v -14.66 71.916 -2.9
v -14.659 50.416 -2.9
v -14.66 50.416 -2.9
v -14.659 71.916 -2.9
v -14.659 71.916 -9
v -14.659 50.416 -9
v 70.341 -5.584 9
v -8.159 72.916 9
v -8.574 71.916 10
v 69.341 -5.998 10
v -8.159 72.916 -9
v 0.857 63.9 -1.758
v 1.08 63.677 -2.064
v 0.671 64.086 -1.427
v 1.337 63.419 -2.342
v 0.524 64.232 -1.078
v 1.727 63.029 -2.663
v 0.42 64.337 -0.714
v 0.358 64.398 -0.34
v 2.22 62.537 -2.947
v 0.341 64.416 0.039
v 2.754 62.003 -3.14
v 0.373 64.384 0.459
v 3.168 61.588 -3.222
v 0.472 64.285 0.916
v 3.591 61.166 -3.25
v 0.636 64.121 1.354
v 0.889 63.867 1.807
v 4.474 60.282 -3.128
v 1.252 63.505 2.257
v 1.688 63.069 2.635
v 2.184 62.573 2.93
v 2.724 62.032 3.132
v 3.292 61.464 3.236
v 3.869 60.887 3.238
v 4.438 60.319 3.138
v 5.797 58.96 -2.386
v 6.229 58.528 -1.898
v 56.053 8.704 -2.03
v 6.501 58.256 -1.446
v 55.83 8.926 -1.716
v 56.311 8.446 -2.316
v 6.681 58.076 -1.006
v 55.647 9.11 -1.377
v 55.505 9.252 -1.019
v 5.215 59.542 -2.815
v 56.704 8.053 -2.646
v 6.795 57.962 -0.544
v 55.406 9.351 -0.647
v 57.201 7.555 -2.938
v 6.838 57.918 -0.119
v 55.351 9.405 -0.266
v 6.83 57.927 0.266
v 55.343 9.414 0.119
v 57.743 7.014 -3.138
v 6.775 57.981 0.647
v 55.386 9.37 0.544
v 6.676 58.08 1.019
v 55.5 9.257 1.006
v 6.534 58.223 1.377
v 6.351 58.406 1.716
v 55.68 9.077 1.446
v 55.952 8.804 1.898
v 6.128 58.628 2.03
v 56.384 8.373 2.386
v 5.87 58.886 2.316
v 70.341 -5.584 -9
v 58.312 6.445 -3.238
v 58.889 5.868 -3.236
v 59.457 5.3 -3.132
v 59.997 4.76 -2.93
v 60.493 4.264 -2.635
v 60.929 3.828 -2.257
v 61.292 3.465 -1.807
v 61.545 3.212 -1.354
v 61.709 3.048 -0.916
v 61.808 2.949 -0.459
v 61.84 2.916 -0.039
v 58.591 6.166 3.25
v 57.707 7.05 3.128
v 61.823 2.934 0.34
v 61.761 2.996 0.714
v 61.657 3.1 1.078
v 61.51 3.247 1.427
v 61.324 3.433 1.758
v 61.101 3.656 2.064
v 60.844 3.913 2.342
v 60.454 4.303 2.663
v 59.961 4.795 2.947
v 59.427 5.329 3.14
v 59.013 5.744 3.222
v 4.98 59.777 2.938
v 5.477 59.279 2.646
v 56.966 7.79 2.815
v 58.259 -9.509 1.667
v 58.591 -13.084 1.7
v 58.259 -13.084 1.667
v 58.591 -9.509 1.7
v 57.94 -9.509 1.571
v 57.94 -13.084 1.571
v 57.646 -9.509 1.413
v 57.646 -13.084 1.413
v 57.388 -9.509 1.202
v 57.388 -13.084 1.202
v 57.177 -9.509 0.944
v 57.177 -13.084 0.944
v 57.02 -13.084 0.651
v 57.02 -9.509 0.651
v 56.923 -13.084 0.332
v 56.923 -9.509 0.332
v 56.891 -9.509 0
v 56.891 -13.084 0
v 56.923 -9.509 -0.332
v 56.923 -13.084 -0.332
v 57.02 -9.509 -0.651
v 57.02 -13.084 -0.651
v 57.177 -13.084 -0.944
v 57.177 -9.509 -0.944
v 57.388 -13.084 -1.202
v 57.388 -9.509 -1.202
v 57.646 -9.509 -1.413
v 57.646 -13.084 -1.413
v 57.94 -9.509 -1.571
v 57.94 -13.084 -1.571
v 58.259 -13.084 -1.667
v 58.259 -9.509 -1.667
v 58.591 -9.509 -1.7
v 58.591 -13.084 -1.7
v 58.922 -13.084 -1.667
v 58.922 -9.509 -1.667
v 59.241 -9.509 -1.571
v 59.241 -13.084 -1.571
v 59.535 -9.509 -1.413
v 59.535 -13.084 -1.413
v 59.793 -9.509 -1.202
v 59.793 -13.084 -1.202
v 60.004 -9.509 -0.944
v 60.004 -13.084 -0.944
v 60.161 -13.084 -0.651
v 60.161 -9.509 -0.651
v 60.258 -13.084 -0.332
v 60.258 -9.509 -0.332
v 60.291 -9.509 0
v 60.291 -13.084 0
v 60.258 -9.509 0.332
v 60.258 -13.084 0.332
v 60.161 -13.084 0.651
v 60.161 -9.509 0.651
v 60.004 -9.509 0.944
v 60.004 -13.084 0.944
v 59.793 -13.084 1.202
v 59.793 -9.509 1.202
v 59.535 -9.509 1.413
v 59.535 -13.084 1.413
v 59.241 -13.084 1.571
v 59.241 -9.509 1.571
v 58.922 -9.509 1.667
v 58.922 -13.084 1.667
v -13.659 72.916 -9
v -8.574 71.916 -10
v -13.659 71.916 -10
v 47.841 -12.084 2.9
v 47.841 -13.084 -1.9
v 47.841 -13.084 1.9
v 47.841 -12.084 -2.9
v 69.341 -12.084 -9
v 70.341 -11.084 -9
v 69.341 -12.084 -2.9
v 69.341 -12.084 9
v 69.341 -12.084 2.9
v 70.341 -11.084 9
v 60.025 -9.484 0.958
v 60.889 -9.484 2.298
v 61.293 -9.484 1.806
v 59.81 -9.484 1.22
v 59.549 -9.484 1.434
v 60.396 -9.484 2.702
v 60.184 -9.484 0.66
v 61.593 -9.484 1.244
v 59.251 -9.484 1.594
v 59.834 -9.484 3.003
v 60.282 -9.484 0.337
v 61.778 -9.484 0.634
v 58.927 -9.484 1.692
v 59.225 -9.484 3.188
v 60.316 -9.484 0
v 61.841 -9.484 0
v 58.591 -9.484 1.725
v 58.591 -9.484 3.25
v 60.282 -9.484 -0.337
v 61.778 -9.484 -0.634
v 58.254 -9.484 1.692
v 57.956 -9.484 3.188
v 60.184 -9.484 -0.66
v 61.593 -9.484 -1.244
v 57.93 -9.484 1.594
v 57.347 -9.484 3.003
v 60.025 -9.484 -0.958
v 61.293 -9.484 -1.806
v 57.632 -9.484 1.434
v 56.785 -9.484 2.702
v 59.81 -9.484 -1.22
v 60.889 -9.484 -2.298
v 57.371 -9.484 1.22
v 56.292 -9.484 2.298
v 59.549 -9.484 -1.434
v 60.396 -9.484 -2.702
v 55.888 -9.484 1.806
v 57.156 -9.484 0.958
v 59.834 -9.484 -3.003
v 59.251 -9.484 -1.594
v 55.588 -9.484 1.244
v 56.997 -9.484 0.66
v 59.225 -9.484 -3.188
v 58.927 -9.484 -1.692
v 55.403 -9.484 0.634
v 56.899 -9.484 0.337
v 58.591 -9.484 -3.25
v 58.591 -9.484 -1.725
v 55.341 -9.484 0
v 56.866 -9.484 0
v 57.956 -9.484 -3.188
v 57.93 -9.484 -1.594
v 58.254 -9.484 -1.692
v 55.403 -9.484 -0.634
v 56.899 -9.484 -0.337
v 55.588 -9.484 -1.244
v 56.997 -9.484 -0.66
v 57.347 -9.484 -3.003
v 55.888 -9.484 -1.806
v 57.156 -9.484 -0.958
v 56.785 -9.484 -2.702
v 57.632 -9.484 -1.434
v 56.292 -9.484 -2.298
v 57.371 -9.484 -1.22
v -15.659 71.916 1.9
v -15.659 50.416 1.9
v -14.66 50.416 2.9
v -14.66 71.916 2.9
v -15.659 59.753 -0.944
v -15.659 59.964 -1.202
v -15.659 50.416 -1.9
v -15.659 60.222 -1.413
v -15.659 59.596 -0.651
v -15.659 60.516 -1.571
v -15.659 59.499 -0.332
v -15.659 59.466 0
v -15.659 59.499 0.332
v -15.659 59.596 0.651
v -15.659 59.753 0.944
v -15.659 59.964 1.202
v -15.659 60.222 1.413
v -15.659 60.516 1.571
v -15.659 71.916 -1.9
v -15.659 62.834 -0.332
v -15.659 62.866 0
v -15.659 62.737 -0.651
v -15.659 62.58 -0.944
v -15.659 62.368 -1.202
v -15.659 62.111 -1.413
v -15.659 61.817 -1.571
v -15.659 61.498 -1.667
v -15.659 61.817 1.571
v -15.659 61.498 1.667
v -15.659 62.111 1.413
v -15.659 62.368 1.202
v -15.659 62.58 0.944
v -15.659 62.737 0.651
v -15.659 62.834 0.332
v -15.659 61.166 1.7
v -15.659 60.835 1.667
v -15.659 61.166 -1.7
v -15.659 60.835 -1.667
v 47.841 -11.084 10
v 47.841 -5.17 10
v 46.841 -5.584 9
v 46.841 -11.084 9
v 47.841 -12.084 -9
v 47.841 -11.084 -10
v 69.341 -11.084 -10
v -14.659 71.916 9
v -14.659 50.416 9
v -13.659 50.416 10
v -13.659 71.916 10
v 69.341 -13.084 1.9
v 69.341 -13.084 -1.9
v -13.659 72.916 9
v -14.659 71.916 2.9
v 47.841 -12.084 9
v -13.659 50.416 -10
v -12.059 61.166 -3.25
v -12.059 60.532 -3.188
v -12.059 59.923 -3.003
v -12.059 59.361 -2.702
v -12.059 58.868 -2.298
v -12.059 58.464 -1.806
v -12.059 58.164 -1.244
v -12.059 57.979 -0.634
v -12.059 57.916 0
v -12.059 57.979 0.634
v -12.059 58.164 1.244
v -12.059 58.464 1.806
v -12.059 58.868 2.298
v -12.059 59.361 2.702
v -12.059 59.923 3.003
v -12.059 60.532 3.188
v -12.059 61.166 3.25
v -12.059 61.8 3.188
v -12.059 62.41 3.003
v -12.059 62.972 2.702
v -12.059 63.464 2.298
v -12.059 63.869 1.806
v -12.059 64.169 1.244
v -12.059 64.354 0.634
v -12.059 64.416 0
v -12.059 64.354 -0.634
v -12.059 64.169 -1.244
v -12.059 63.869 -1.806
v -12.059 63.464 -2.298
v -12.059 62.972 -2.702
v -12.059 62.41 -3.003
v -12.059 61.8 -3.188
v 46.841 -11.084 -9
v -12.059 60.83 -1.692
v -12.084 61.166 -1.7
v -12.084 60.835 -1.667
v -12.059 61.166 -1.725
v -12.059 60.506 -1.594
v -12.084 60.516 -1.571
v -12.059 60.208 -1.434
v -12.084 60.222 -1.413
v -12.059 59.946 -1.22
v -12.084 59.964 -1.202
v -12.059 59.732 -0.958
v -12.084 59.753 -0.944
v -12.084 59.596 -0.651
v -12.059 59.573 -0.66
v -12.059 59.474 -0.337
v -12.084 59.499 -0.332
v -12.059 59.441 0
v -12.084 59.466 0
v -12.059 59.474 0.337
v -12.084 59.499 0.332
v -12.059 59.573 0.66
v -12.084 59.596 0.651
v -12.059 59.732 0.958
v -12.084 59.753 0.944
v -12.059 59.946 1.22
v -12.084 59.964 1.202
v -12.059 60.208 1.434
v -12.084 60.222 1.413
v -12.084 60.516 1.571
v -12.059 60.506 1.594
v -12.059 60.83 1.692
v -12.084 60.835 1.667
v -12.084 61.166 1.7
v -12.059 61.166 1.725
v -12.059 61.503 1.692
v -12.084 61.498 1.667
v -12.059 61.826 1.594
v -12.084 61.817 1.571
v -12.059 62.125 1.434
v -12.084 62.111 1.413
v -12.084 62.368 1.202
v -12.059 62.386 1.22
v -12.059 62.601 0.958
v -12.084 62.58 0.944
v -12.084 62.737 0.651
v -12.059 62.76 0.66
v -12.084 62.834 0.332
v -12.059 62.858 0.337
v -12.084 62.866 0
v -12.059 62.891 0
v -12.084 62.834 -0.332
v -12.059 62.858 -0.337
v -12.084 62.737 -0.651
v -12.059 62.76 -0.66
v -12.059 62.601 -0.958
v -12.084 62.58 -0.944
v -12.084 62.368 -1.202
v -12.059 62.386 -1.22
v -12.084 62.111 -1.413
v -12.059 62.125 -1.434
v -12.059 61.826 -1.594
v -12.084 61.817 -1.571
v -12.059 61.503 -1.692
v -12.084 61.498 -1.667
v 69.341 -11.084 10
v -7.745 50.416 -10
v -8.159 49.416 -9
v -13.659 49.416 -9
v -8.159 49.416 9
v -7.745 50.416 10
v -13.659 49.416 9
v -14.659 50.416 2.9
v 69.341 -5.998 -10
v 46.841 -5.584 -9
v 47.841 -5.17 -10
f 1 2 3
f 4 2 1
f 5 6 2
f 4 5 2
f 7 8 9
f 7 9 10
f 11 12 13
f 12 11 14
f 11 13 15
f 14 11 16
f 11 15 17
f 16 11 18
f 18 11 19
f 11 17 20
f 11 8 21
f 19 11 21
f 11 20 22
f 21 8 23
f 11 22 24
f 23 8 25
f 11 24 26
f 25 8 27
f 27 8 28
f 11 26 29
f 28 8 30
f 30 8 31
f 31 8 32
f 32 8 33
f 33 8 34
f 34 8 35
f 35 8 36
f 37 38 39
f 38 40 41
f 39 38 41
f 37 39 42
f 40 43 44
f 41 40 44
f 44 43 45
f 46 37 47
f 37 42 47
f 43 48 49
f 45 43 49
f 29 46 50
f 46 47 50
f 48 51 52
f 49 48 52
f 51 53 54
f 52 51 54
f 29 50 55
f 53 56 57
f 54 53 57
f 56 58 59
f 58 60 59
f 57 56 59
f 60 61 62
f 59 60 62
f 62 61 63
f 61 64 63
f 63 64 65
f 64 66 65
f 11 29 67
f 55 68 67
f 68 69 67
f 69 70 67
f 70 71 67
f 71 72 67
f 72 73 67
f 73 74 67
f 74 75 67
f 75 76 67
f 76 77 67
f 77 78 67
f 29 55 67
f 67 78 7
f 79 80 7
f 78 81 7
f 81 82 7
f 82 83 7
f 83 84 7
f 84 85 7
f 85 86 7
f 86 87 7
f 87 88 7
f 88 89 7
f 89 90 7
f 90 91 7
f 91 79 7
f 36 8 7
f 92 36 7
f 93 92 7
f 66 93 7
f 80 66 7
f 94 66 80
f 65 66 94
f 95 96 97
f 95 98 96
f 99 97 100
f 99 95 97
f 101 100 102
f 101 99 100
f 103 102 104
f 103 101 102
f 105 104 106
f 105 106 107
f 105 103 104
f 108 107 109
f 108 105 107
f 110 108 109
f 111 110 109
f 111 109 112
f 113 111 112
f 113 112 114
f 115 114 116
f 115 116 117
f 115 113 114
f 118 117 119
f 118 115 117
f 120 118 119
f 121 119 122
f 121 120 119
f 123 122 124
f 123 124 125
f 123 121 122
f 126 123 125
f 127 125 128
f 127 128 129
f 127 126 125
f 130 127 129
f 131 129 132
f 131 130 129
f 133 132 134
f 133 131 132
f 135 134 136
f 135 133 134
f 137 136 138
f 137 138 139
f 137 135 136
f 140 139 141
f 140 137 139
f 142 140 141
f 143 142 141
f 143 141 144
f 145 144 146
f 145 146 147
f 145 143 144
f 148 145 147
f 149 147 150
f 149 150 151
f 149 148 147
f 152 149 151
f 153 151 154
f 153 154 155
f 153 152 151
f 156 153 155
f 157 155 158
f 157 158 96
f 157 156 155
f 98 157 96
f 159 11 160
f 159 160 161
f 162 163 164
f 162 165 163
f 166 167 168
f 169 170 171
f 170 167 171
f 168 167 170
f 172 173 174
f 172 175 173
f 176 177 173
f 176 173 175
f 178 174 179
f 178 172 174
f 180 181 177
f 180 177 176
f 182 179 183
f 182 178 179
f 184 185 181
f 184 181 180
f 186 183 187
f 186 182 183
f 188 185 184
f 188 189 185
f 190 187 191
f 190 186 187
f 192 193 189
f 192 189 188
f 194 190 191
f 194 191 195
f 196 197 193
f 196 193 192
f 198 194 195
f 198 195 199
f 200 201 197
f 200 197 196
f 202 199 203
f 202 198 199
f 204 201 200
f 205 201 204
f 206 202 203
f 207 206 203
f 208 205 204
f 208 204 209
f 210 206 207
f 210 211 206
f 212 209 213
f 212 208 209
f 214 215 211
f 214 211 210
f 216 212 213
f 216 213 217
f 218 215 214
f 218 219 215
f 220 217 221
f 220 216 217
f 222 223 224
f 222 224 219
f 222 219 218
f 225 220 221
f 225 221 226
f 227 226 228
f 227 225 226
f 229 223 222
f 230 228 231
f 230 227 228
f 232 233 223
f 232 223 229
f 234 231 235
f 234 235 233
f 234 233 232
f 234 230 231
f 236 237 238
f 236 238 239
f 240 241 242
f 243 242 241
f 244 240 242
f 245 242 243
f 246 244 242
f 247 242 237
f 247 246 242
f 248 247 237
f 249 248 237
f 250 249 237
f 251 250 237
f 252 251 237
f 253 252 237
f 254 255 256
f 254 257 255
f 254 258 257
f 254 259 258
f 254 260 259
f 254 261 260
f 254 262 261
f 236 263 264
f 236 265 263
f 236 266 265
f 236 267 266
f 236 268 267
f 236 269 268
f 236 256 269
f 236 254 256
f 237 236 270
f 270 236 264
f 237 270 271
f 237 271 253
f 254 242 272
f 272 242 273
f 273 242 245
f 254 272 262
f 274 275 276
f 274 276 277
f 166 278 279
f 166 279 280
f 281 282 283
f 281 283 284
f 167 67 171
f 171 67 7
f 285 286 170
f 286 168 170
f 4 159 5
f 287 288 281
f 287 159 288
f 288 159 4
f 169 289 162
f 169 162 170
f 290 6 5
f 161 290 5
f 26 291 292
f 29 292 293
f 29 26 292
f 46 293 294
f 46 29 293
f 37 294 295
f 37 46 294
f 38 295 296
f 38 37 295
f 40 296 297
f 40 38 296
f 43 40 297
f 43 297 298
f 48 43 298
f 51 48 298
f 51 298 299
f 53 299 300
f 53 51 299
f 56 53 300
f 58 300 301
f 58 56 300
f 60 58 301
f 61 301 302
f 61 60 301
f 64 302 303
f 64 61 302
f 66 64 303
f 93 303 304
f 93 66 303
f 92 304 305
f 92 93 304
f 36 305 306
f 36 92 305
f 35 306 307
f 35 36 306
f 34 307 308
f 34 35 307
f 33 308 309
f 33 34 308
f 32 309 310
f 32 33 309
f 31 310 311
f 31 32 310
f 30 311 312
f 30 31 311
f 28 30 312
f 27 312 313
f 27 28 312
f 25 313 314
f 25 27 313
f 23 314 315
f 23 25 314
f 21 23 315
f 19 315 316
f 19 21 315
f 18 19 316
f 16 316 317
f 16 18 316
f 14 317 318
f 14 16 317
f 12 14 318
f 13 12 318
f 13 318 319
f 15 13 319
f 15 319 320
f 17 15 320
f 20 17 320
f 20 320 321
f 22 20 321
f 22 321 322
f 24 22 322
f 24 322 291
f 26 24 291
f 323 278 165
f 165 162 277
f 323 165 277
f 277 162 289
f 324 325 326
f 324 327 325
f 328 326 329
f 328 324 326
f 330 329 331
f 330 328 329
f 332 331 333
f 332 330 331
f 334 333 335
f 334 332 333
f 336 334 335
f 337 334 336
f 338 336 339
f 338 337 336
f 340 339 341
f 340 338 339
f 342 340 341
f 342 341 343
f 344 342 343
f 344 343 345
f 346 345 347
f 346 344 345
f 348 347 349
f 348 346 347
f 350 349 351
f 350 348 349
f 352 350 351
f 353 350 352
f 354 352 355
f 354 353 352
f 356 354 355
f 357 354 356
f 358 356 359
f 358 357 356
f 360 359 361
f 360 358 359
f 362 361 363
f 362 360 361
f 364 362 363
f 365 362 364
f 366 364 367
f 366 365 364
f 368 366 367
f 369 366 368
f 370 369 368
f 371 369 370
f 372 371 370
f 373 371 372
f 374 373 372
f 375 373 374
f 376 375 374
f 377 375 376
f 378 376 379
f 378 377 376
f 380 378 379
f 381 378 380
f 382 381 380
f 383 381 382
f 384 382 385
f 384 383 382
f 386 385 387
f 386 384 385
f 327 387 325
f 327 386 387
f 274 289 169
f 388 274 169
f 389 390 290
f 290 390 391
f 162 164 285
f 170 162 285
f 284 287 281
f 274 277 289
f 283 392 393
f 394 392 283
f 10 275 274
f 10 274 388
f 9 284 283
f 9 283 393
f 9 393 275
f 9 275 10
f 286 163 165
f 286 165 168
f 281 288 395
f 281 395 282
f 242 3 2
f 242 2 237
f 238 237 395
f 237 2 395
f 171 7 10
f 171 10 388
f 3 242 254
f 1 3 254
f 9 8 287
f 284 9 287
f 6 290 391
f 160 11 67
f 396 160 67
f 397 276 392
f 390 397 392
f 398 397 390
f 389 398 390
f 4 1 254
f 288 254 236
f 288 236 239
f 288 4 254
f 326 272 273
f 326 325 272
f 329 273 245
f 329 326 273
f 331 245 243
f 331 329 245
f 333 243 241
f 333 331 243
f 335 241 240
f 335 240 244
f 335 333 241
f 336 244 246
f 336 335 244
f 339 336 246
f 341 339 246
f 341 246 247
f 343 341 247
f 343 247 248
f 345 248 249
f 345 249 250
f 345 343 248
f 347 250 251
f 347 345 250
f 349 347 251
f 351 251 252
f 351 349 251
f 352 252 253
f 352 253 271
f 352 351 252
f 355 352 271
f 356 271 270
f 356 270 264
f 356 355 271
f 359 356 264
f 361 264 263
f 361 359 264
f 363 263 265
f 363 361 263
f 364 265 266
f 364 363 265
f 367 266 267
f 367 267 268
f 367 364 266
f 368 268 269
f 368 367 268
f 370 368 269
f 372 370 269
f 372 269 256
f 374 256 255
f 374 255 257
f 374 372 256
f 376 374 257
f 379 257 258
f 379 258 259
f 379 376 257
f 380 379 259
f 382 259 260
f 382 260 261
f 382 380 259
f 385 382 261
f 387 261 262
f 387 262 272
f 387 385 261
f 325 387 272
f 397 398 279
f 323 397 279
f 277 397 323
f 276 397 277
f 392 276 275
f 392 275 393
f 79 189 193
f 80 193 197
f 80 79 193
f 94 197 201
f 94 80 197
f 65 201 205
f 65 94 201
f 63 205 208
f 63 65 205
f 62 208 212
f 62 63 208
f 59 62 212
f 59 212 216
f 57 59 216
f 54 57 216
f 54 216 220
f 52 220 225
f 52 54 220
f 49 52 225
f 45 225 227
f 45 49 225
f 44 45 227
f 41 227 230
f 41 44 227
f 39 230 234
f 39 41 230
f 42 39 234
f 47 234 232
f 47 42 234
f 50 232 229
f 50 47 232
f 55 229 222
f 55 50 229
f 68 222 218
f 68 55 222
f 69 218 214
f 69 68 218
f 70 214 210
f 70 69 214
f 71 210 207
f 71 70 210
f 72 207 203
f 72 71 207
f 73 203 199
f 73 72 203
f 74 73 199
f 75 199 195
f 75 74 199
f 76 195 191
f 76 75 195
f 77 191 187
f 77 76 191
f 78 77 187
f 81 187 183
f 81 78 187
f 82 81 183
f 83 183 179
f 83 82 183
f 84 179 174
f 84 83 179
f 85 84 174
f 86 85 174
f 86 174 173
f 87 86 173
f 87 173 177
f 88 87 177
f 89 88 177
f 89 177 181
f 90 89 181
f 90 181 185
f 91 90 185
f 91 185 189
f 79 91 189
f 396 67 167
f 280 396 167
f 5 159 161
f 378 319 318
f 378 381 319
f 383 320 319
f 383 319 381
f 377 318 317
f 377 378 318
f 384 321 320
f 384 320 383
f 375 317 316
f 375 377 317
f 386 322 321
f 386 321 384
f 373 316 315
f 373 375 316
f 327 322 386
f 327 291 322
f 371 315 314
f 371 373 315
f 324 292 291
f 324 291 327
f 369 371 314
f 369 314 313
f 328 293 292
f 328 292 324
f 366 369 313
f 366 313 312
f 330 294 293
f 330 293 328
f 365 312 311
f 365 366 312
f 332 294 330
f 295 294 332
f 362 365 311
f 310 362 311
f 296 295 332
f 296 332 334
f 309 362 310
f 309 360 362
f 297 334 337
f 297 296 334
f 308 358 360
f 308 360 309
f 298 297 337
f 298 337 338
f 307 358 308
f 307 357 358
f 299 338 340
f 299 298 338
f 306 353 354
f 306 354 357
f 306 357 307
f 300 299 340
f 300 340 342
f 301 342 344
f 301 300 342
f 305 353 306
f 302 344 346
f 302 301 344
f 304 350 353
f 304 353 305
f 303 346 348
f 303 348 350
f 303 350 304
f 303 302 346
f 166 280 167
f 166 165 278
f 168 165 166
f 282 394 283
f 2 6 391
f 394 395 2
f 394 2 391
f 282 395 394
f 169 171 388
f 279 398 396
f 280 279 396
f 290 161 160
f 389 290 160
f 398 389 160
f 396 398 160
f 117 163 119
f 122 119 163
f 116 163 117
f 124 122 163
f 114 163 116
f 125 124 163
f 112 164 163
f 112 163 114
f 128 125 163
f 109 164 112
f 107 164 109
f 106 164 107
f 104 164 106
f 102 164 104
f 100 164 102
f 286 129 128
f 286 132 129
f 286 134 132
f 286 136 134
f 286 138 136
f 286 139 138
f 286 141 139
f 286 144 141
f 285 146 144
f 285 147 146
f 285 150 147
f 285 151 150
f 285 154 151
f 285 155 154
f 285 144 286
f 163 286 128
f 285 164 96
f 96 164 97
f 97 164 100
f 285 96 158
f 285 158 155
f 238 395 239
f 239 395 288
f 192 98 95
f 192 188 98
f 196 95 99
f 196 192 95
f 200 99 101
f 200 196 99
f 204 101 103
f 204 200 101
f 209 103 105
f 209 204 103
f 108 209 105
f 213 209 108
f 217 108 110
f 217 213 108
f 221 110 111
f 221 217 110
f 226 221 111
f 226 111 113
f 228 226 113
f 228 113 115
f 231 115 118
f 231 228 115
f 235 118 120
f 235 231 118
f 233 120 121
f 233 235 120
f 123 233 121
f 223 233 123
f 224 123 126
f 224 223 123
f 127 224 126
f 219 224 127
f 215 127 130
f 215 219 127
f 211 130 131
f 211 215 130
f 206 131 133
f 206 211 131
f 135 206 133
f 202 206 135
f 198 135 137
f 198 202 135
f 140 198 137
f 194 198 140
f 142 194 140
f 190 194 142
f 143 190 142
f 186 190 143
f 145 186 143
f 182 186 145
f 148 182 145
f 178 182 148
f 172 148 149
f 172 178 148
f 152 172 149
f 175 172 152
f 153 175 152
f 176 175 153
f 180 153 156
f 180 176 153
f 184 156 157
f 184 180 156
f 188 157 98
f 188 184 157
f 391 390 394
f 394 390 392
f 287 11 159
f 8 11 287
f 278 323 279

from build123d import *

# Parameters (mm, degrees)
BOSS_EXTRUDE1_DEPTH = 10
SKETCH29_W          = 20
SKETCH29_H          = 23.5
BOSS_EXTRUDE4_DEPTH = 6.5
SKETCH30_W          = 23.5
SKETCH30_H          = 20
BOSS_EXTRUDE5_DEPTH = 6.5
CHAMFER1_SIZE       = 1
SKETCH4_W           = 21.5
SKETCH4_H           = 5.8
BOSS_EXTRUDE2_DEPTH = 1
SKETCH5_W           = 5.8
SKETCH5_H           = 21.5
BOSS_EXTRUDE3_DEPTH = 1
CHAMFER2_SIZE       = 1


with BuildPart() as part:
    # Sketch2 → Boss-Extrude1 (new, symmetric)
    with BuildSketch(Plane.XY):
        Polygon((-8.159496186, 72.916243655), (70.340503814, -5.583756345), (46.840503814, -5.583756345), (-8.159496186, 49.416243655), align=None)
    extrude(amount=BOSS_EXTRUDE1_DEPTH, both=True)

    # Sketch29 → Boss-Extrude4 (add)
    with BuildSketch(Plane.ZY.offset(8.159496186)):
        with Locations((0, 61.166243655)):
            Rectangle(SKETCH29_W, SKETCH29_H)
    extrude(amount=BOSS_EXTRUDE4_DEPTH)

    # Sketch30 → Boss-Extrude5 (add)
    with BuildSketch(Plane.XZ.offset(5.583756345)):
        with Locations((58.590503814, 0)):
            Rectangle(SKETCH30_W, SKETCH30_H)
    extrude(amount=BOSS_EXTRUDE5_DEPTH)

    # Chamfer1
    chamfer1_edges = [part.edges().sort_by_distance(p)[0] for p in [
        (-11.409496186, 72.916243655, 10),
        (-11.409496186, 72.916243655, -10),
        (-11.409496186, 49.416243655, -10),
        (-11.409496186, 49.416243655, 10),
        (-14.659496186, 72.916243655, 0),
        (-14.659496186, 61.166243655, -10),
        (31.090503814, 33.666243655, 10),
        (-14.659496186, 49.416243655, 0),
        (-14.659496186, 61.166243655, 10),
        (46.840503814, -8.833756345, 10),
        (46.840503814, -8.833756345, -10),
        (70.340503814, -8.833756345, -10),
        (70.340503814, -8.833756345, 10),
        (46.840503814, -12.083756345, 0),
        (58.590503814, -12.083756345, -10),
        (70.340503814, -12.083756345, 0),
        (58.590503814, -12.083756345, 10),
        (31.090503814, 33.666243655, -10),
        (19.340503814, 21.916243655, -10),
        (19.340503814, 21.916243655, 10),
    ]]
    chamfer(chamfer1_edges, length=CHAMFER1_SIZE)

    # Sketch4 → Boss-Extrude2 (add)
    with BuildSketch(Plane.XZ.offset(12.083756345)):
        with Locations((58.590503814, 0)):
            Rectangle(SKETCH4_W, SKETCH4_H)
    extrude(amount=BOSS_EXTRUDE2_DEPTH)

    # Sketch5 → Boss-Extrude3 (add)
    with BuildSketch(Plane.ZY.offset(14.659496186)):
        with Locations((0, 61.166243655)):
            Rectangle(SKETCH5_W, SKETCH5_H)
    extrude(amount=BOSS_EXTRUDE3_DEPTH)

    # Chamfer2
    chamfer2_edges = [part.edges().sort_by_distance(p)[0] for p in [
        (-15.659496186, 61.166243655, 2.9),
        (-15.659496186, 61.166243655, -2.9),
        (58.590503814, -13.083756345, -2.9),
        (58.590503814, -13.083756345, 2.9),
    ]]
    chamfer(chamfer2_edges, length=CHAMFER2_SIZE - 0.0001)  # a hair under: the kernel refuses the full size

    # Sketch34 → CBORE for M3 Hex Socket Head Cap Screw4 (revolve, cut)
    with BuildSketch(Plane(origin=(25.340503814, 61.166243655, 0), x_dir=(0, 0, -1), z_dir=(0, 1, 0))):
        Polygon((0, 0), (0, 41), (1.7, 41), (1.7, 37.425), (1.725, 37.4), (3.25, 37.4), (3.25, 0.025), (3.275, 0), align=None)
    revolve(axis=Axis((31.690503814, 61.166243655, 0), (-1, 0, 0)), mode=Mode.SUBTRACT)

    # Sketch36 → CBORE for M3 Hex Socket Head Cap Screw5 (revolve, cut)
    with BuildSketch(Plane(origin=(58.590503814, 27.916243655, 0), x_dir=(0, 0, 1), z_dir=(1, 0, 0))):
        Polygon((0, 0), (0, 41), (1.7, 41), (1.7, 37.425), (1.725, 37.4), (3.25, 37.4), (3.25, 0.025), (3.275, 0), align=None)
    revolve(axis=Axis((58.590503814, 34.266243655, 0), (0, -1, 0)), mode=Mode.SUBTRACT)


solid = part.part
